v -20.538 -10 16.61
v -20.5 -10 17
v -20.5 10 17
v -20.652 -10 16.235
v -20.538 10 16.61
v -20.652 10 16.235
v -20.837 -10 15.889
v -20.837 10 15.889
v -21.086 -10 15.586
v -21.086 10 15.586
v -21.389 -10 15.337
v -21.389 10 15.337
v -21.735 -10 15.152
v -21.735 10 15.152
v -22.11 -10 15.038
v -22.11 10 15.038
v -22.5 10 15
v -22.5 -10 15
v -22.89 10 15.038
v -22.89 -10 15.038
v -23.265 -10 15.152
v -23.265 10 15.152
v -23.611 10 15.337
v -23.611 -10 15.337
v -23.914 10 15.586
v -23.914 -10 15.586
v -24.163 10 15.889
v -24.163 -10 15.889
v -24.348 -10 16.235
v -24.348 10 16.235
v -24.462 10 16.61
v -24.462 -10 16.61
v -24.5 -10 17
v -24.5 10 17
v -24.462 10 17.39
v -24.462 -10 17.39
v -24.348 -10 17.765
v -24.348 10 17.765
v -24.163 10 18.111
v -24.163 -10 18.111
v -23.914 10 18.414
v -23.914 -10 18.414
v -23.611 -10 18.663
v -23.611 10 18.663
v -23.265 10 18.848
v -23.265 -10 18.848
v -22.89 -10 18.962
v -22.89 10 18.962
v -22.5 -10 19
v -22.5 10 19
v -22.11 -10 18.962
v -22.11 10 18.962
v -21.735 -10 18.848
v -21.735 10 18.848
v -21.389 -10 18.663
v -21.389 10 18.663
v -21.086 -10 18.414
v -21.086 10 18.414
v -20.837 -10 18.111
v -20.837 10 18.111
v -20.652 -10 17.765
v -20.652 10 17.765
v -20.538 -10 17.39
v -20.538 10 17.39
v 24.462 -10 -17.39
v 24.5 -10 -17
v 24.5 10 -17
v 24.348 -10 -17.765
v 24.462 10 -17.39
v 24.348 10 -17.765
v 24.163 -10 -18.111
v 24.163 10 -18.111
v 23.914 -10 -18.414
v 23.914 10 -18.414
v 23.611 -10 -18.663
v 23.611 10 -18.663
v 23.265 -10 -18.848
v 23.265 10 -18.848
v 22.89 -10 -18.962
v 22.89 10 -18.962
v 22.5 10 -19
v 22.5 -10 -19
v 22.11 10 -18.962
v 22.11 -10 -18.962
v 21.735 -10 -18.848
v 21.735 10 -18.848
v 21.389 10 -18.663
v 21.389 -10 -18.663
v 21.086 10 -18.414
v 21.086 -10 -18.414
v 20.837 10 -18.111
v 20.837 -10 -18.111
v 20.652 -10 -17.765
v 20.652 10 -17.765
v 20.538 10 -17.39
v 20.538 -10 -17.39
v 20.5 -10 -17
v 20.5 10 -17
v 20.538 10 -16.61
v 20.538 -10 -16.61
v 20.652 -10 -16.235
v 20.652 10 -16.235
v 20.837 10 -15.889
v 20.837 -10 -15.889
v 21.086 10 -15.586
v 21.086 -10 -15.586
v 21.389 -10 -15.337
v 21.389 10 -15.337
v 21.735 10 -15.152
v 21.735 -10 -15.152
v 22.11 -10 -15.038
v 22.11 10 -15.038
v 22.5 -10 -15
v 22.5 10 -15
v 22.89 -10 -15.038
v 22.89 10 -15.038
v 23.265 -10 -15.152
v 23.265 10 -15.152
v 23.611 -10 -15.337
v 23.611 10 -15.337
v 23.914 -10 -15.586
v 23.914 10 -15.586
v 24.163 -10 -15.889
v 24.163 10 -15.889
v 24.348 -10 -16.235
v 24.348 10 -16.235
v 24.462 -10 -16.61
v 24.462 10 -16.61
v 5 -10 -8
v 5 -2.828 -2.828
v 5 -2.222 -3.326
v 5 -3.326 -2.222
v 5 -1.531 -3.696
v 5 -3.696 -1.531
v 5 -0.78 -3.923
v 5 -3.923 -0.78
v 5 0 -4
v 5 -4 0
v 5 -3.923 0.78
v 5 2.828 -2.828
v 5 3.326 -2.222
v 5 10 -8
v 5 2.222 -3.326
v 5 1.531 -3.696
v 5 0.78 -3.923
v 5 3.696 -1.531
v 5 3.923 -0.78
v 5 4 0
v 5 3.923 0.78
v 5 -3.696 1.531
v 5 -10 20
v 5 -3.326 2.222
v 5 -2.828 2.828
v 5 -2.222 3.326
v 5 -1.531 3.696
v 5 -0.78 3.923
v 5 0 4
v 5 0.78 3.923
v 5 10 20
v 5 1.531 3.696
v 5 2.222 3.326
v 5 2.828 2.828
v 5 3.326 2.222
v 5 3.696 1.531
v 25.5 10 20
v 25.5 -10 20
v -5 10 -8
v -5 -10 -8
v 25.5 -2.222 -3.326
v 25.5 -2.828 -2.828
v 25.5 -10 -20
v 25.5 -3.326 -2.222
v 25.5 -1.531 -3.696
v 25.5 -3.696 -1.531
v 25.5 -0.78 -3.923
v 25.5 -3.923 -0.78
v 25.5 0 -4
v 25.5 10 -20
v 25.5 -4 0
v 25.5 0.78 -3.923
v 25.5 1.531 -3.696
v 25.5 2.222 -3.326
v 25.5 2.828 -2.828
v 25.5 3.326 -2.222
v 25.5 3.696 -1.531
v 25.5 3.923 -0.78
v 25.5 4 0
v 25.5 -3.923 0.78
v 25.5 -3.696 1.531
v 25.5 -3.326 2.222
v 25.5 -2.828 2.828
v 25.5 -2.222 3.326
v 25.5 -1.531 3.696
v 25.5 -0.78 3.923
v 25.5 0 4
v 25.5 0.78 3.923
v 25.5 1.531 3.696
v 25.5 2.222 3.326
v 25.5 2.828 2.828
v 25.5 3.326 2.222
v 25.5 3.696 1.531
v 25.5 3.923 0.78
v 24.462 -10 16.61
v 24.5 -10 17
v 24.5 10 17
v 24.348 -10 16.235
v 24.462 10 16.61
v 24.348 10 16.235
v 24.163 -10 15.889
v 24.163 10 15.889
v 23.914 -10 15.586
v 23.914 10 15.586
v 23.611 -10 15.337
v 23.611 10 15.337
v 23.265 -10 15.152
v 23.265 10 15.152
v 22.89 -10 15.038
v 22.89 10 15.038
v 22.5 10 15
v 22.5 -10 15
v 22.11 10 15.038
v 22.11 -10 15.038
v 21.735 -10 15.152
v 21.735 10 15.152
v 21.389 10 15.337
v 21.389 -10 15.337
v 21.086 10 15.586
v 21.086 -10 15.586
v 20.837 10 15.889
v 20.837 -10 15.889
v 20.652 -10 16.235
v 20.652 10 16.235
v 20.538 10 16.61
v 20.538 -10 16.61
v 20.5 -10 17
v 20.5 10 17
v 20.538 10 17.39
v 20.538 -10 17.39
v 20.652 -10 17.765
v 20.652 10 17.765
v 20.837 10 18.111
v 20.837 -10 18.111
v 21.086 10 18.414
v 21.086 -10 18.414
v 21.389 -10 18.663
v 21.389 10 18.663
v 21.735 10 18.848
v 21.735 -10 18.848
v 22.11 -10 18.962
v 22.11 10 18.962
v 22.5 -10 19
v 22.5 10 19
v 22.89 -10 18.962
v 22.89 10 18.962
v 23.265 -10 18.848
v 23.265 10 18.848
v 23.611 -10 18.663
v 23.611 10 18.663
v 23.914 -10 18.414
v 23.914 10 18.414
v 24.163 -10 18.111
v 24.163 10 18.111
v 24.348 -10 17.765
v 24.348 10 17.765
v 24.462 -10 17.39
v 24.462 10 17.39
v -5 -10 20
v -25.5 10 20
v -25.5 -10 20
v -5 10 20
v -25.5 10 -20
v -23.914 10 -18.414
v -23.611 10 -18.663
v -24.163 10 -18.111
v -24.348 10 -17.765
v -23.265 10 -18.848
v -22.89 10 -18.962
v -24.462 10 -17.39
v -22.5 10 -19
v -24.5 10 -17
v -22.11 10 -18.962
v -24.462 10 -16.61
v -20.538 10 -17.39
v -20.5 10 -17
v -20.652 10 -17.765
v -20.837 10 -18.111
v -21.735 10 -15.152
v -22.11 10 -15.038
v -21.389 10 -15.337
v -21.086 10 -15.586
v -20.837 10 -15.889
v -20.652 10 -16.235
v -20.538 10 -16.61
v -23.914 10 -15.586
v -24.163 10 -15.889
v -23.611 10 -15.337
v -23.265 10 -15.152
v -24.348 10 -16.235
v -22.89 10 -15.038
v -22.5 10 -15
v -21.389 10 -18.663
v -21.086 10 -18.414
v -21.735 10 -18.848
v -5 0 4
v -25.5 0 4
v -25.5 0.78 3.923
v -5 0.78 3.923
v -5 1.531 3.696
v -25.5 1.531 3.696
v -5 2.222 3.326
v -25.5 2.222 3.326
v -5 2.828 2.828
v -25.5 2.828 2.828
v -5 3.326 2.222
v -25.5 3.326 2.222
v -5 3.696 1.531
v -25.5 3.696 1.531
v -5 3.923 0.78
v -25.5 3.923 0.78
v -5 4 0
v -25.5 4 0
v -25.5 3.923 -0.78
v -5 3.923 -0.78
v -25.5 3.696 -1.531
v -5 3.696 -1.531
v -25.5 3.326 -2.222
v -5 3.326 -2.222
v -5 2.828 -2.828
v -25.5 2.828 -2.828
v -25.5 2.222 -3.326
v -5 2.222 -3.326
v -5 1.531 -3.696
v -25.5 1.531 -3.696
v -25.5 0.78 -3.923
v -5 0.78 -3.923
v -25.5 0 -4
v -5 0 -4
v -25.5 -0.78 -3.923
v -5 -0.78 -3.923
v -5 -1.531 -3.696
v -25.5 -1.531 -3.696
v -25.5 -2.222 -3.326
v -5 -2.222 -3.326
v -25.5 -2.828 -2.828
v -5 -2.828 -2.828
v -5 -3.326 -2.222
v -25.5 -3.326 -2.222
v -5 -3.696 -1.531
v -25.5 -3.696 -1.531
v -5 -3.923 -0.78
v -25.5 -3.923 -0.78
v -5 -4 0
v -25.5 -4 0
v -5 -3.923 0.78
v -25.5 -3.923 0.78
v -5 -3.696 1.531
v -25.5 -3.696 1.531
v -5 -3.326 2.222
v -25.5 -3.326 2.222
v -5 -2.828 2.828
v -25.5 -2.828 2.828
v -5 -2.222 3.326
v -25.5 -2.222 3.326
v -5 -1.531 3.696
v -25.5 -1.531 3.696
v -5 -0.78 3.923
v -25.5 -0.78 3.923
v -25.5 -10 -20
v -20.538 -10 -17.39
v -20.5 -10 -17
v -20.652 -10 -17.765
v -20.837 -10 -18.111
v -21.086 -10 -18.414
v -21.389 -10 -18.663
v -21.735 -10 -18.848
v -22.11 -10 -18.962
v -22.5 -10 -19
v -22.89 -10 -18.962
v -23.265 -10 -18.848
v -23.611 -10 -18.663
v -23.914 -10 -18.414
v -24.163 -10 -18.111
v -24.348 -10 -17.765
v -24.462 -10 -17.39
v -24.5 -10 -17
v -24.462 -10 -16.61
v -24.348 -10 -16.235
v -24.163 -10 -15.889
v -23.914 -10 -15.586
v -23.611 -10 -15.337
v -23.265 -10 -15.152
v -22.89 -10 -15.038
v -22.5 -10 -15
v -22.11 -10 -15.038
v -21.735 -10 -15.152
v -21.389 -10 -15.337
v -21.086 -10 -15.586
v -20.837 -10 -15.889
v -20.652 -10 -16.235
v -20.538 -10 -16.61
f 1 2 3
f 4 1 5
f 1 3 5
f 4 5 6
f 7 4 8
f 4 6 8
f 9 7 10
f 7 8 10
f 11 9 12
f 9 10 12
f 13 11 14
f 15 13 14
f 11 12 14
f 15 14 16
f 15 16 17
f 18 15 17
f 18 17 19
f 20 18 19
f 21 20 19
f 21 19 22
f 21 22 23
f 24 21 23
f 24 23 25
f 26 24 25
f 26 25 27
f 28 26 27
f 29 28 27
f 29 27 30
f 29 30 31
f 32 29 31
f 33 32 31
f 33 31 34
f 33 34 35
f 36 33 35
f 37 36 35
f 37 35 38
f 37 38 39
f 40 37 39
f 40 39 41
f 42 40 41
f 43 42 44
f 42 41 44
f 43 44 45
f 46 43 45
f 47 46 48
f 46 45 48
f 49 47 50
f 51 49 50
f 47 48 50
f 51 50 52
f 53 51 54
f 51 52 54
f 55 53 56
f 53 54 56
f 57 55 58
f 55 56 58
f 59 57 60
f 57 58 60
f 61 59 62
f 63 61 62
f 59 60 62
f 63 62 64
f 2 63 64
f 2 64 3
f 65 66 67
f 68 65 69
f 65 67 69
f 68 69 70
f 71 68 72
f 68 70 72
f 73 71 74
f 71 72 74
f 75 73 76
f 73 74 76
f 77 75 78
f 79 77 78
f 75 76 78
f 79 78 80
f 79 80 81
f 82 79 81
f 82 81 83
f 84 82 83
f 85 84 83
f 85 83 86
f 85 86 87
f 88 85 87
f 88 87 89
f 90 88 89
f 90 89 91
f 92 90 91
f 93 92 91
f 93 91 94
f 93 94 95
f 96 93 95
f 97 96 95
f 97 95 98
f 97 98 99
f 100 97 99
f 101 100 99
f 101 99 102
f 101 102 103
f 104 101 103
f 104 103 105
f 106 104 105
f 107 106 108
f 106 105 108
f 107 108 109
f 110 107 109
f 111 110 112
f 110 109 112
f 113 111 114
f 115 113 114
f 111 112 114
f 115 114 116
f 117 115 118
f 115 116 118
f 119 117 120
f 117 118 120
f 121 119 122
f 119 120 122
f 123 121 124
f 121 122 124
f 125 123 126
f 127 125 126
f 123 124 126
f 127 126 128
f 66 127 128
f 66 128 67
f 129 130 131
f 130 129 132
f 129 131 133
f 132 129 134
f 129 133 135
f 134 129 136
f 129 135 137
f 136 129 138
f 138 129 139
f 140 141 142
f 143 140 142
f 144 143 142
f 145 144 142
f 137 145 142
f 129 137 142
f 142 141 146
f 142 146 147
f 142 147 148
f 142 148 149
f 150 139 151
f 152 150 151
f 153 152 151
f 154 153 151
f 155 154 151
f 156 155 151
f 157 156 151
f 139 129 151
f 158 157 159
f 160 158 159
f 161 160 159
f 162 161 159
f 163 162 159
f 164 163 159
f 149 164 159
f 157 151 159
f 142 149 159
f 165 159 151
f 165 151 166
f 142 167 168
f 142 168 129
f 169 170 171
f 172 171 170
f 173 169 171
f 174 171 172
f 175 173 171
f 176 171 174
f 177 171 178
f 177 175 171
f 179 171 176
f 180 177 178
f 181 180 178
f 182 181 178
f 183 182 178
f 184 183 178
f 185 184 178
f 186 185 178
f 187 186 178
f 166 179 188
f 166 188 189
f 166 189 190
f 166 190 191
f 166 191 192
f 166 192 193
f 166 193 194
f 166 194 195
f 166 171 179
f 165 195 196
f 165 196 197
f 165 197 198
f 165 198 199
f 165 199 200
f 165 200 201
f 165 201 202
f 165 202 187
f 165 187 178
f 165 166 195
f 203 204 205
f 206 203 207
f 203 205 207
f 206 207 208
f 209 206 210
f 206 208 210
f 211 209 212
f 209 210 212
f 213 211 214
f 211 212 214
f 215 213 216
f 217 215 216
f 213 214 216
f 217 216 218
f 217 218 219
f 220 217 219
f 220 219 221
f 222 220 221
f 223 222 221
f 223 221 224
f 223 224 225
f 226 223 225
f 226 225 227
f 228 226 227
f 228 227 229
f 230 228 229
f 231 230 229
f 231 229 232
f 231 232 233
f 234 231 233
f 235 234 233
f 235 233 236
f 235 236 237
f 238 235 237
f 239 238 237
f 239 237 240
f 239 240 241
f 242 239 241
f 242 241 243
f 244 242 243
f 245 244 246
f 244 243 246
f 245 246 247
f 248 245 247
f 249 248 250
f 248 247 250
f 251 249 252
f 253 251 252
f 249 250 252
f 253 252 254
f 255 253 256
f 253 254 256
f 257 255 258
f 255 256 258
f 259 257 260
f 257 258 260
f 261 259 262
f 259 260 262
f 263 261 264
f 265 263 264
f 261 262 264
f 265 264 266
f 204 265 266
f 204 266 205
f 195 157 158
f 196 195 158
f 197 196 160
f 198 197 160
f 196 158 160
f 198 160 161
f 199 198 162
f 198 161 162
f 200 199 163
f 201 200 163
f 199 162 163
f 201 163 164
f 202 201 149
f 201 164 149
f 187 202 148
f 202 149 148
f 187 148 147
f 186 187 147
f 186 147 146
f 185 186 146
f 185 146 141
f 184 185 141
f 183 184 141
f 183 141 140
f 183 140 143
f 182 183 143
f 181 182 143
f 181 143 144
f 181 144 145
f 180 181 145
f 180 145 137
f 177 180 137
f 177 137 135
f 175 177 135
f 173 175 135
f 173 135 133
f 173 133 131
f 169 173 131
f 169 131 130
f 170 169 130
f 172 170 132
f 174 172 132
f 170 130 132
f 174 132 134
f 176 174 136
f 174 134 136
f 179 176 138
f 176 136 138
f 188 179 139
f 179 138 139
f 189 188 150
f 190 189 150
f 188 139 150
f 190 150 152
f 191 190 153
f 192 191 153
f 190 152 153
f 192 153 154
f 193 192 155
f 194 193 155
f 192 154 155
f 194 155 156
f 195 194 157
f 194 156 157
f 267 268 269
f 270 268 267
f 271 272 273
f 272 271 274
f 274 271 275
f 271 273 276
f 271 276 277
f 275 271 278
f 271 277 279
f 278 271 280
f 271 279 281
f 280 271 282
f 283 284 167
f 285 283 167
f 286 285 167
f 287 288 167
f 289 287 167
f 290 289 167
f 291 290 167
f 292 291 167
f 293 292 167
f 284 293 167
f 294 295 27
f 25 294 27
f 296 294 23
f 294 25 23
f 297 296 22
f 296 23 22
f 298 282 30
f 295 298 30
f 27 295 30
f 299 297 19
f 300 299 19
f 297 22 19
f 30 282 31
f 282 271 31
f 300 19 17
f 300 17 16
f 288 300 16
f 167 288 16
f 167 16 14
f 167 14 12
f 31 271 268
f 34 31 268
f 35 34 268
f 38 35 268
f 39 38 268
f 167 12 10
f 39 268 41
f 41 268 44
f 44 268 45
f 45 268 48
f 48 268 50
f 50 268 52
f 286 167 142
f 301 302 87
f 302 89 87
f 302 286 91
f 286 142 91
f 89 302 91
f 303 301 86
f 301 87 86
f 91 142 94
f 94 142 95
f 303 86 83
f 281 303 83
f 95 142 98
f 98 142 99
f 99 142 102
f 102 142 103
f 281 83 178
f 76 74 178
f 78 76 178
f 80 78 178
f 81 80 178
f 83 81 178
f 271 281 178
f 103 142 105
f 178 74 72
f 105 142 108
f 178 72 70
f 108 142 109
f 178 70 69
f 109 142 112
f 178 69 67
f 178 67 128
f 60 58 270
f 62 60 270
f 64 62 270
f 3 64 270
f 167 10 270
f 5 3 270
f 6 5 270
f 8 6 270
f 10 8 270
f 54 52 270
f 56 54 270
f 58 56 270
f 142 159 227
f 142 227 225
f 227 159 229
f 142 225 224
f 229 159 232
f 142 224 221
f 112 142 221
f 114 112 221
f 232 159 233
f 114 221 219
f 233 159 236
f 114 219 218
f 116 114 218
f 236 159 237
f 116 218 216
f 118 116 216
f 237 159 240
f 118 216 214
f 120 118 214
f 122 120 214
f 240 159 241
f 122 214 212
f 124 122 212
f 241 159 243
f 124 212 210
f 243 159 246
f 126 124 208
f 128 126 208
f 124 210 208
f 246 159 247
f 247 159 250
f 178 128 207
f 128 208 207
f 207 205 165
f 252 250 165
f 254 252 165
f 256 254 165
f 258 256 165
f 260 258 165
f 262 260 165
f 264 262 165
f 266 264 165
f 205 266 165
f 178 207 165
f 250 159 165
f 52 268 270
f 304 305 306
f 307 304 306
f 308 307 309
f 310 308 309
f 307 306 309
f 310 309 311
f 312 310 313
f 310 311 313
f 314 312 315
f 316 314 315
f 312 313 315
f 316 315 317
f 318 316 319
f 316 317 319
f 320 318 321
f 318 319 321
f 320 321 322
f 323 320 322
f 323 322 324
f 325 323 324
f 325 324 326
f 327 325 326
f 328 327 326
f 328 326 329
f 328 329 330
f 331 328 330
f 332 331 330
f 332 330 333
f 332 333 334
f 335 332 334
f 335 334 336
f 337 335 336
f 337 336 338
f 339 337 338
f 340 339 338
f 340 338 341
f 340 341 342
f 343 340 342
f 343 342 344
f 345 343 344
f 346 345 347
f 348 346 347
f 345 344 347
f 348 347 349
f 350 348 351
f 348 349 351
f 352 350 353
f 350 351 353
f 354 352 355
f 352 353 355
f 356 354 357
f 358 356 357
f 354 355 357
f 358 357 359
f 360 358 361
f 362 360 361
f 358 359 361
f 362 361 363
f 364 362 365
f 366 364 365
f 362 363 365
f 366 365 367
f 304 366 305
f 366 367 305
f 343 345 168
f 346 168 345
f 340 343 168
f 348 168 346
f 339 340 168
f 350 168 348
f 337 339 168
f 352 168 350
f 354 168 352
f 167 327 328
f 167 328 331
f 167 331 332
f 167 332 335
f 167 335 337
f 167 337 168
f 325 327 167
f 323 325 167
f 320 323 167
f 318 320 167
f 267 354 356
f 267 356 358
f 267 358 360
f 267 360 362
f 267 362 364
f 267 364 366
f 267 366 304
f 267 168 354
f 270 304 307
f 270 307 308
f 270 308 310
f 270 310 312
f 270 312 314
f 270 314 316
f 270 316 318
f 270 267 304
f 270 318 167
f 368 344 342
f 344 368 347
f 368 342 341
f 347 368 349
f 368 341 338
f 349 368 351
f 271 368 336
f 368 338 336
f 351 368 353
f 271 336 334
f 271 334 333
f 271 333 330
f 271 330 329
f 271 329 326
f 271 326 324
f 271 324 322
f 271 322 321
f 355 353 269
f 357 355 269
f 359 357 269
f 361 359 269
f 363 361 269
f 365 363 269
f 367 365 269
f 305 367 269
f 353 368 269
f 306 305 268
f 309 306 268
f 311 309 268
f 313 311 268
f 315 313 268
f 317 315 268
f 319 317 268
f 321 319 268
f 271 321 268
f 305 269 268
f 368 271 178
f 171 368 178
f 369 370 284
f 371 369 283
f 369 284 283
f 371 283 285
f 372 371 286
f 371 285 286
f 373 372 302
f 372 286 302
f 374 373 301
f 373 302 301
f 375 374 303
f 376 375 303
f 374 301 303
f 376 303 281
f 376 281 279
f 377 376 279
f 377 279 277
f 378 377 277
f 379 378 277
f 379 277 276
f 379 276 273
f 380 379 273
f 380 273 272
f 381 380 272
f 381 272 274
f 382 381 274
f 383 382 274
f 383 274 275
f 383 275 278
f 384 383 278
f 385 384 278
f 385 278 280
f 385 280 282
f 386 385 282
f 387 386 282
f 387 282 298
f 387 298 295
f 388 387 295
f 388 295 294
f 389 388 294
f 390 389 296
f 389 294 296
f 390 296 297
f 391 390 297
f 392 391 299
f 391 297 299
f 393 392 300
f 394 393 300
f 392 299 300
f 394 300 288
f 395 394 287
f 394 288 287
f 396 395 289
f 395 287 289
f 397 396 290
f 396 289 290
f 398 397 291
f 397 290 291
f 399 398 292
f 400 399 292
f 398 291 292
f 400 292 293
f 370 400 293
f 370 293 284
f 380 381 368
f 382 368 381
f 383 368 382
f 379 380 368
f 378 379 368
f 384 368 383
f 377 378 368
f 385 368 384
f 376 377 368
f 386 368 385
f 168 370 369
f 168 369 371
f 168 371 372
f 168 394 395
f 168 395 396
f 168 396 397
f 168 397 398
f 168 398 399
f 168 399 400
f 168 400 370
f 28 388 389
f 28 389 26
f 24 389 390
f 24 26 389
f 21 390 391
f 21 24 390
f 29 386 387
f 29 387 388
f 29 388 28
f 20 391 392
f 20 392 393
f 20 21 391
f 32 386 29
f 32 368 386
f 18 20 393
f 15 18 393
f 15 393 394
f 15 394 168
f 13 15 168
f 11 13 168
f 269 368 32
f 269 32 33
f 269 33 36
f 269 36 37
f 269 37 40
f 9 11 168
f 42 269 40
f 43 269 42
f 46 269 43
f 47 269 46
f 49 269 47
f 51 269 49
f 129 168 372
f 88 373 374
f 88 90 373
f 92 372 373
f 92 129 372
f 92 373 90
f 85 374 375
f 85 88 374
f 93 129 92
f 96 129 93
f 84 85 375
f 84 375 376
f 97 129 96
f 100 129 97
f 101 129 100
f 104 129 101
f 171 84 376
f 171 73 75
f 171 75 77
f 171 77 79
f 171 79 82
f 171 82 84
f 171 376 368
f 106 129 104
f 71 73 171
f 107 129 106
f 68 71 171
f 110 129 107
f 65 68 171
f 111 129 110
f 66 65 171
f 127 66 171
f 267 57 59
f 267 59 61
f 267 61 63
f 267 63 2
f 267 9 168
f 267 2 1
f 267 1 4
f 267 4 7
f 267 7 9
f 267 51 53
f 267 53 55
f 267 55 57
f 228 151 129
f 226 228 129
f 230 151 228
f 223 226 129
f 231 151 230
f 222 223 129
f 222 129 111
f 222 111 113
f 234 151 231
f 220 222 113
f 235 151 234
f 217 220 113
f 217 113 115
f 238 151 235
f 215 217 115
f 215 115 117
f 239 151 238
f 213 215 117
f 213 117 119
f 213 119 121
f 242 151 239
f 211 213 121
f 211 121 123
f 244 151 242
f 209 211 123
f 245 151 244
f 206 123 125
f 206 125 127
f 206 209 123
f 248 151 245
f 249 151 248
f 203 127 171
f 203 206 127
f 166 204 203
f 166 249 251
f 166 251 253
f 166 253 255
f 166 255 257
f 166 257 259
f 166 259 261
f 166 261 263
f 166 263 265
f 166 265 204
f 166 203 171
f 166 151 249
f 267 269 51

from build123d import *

# Parameters (mm, degrees)
SKETCH_1_W               = 51
SKETCH_1_H               = 20
EXTRUDE_1_DEPTH          = 20
SKETCH_2_W               = 10
SKETCH_2_H               = 20
CUT_EXTRUDE_1_DEPTH      = 28
SKETCH_3_R               = 4
CUT_EXTRUDE_2_DEPTH      = 1
CUT_EXTRUDE_2_DEPTH_BACK = 52
SKETCH_4_R               = 2
CUT_EXTRUDE_3_DEPTH      = 21


with BuildPart() as part:
    # 草图1 → 凸台-拉伸1 (new body, symmetric)
    with BuildSketch(Plane.XY):
        Rectangle(SKETCH_1_W, SKETCH_1_H)
    extrude(amount=EXTRUDE_1_DEPTH, both=True)

    # 草图2 → 切除-拉伸1 (cut)
    with BuildSketch(Plane.XY.offset(20)):
        Rectangle(SKETCH_2_W, SKETCH_2_H)
    extrude(amount=-CUT_EXTRUDE_1_DEPTH, mode=Mode.SUBTRACT)

    # 草图3 → 切除-拉伸2 (cut, two sides)
    with BuildSketch(Plane.ZY.offset(25.5)) as cut_extrude_2_sk:
        Circle(SKETCH_3_R)
    extrude(amount=CUT_EXTRUDE_2_DEPTH, mode=Mode.SUBTRACT)
    extrude(cut_extrude_2_sk.sketch, amount=-CUT_EXTRUDE_2_DEPTH_BACK, mode=Mode.SUBTRACT)

    # 草图4 → 切除-拉伸3 (cut, through all)
    with BuildSketch(Plane(origin=(0, 10, 0), x_dir=(1, 0, 0), z_dir=(0, 1, 0))):
        with Locations((-22.5, 17)):
            Circle(SKETCH_4_R)
        with Locations((22.5, -17)):
            Circle(SKETCH_4_R)
        with Locations((22.5, 17)):
            Circle(SKETCH_4_R)
        with Locations((-22.5, -17)):
            Circle(SKETCH_4_R)
    extrude(amount=-CUT_EXTRUDE_3_DEPTH, mode=Mode.SUBTRACT)


solid = part.part
